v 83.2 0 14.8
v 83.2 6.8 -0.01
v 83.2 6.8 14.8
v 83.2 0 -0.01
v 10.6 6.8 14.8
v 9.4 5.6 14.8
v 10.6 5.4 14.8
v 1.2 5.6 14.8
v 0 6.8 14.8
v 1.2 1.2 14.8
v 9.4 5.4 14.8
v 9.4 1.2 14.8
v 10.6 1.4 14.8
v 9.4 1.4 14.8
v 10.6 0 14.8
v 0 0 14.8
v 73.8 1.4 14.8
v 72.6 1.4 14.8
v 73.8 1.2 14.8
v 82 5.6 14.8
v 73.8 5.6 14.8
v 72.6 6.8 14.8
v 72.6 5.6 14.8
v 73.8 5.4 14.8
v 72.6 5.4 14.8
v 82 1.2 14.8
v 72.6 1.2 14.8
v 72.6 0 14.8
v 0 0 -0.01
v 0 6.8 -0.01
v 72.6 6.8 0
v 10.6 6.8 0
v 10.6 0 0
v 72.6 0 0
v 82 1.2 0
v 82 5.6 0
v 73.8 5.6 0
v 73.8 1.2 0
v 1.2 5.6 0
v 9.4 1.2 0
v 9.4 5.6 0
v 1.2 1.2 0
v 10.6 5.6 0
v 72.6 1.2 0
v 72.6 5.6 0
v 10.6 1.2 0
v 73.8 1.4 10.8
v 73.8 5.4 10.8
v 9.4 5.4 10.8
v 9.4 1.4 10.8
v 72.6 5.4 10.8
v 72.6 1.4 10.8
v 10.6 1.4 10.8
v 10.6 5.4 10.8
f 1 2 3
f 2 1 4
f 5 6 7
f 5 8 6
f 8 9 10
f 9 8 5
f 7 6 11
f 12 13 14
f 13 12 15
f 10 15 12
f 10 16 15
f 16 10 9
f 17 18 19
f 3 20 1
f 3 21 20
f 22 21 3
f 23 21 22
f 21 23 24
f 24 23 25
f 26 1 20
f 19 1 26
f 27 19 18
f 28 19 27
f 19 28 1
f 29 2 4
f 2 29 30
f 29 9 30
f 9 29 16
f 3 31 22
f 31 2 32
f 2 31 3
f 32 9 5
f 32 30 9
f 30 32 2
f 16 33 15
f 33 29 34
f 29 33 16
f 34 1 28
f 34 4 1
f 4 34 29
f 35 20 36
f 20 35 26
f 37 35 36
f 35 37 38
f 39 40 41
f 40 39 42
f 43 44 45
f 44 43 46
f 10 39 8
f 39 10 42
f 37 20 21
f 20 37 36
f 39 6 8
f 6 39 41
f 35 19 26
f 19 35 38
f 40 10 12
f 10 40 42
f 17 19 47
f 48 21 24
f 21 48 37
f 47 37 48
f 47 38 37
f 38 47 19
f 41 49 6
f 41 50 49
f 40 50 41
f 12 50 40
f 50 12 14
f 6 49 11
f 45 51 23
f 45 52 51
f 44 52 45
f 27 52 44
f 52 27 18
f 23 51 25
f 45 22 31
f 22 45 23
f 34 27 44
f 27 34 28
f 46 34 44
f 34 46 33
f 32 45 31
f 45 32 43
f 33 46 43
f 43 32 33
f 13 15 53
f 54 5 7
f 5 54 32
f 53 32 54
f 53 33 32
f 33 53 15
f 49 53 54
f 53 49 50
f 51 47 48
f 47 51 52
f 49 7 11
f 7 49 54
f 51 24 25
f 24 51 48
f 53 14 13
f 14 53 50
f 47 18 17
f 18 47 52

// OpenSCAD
// file: ../Base/Boxes.scad
// Fischertechnik Box Foundation
// Pre-designed Boxes

use <Constants.scad>

include <PlacementOptions.scad>

box190Width = 190;
box190Depth = 130;
box130Width = 130;
box130Depth = 95;
boxUsageHeight = 33.9;
boxWallThickness = 2.4;
boxBaseThickness = 1.0;
boxWebWidth = 3.0;

// getBoxWallThickness()
// Gets the wall thickness of a Fischertechnik Box

function getBoxWallThickness() = boxWallThickness;

// Gets the usable height of a fischertechnik box
function getBoxUsageHeight() = boxUsageHeight;

// Gets the thickness of the Fischertechnik box base.
function getBoxBaseThickness() = boxBaseThickness;

// Gets the width of a box web
function getBoxWebWidth() = boxWebWidth;

// Gets the usable inner space of a Box 190 as an x/y-list
function getBox190Space() = [
    box190Width - 2*getBoxWallThickness(), 
    box190Depth - 2*getBoxWallThickness() ];

// Imports the Fischertechnik empty box 130x190 mm and places it at position 0,0
// 190x130 are the outer sizes, the inner space is slightly smaller. Use getBox190Space() to get the inner sizes.
// This module needs the STL file "Fischertechnik Box 130x190.stl" in the library path.
// The box is positioned that the usable inner space is at the 0,0,0 position. The

module Box190() {
    translate([-getBoxWallThickness(),-getBoxWallThickness(),-getBoxBaseThickness()])
        import("Fischertechnik Box 130x190.stl", convexity=3);
}

// Gets the usable inner space of a Box 130 as an x/y-list
function getBox130Space() = [
    box130Width - 2*getBoxWallThickness(), 
    box130Depth - 2*getBoxWallThickness() ];

// Imports the Fischertechnik empty box 95x130 mm and places it at position 0,0
// 190x130 are the outer sizes, the inner space is slightly smaller. Use getBox190Space() to get the inner sizes.
// This module needs the STL file "Fischertechnik Box 95x130.stl" in the library path.
// The box is positioned that the usable inner space is at the 0,0,0 position. The

module Box130() {
    translate([-getBoxWallThickness(),-getBoxWallThickness(),-getBoxBaseThickness()])
        import("Fischertechnik Box 95x130.stl", convexity=3);
}

// Creates a web at the specified box walls
// corner 0 = LowerLeft, 1 = UpperLeft, 2 = UpperRight, 3 = LowerRight
// side 0 = LeftOfCorner, 1 = RightOfCorner
// distance = Distance in mm from the corner
// box = inner width and depth of the box (default: Box 190)
// webWidth = length of the web (default is 3 mms)
// webThickness = thickness of the web (default is 1 mm)

module BoxWeb(corner, side, distance, box=getBox190Space(), webWidth=getBoxWebWidth(), webThickness=1.0) {
    sink = getBoxWallThickness()/2;

    width = (corner % 2 == 0) ? 
            (side == LeftOfCorner ? webWidth : webThickness) :
            (side == LeftOfCorner ? webThickness : webWidth);

    depth = (corner % 2 == 0) ? 
            (side == RightOfCorner ? webWidth : webThickness) :
            (side == RightOfCorner ? webThickness : webWidth);
    
    xDiff = corner == LowerLeft ? 
                (side == LeftOfCorner ? -sink : distance) :
            (corner == UpperLeft ?                
                (side == LeftOfCorner ? distance : -sink) :
            (corner == UpperRight ?
                (side == LeftOfCorner ? box.x-webWidth+sink : box.x-distance-webThickness) :
                (side == LeftOfCorner ? box.x-distance-webThickness: box.x-webWidth+sink)));

    yDiff = corner == LowerLeft ? 
                (side == RightOfCorner ? -sink : distance) :
            (corner == UpperLeft ?
                (side == RightOfCorner ? box.y-distance : box.y-webWidth+sink) :
            (corner == UpperRight ?
                (side == RightOfCorner ? box.y-webWidth+sink : box.y-distance) :
                (side == RightOfCorner ? distance : -sink)));
    
    translate([xDiff, yDiff, -getExcess()])
        cube([width, depth, boxUsageHeight + 2*getExcess()]);
}
// file: ../Base/Rotation.scad
// Fischertechnik Box Foundation
// Geometry Helpers Rotation

include <PlacementOptions.scad>

// getRotatedSpace(space, rotation=NoRotation)
// Rotates the space dependent on the specified rotation

function getRotatedSpace(space, rotation=NoRotation) = [
    (rotation == Rotate90 || rotation == Rotate270) ? space.y : space.x,
    (rotation == Rotate90 || rotation == Rotate270) ? space.x : space.y
];

// Rotates the given space around the fixed left lower corner
// space = the space the children needs as width/depth list [width,depth]
// rotation = 0 Rotate0 degrees, 1 Rotate90 degrees, 2 Rotate180 degrees, 3 Rotate270 degrees (equivalent to -90)

module RotateFix(space, rotation=Rotate0) {
    dy = (rotation == Rotate0 || rotation == Rotate270) ? 0 :
        (rotation == Rotate90) ? space.x :
        space.y;
    dx = (rotation < Rotate180) ? 0 :
        (rotation == Rotate180) ? space.x :
        space.y;
    
    translate([dx, dy, 0])
        rotate([0, 0, rotations[rotation]])
            children();
}
// file: ../Base/Alignment.scad
// Fischertechnik Box Foundation
// Geometry Helpers Alignment

include <PlacementOptions.scad>

// getAlignedX(elementWidth, spaceWidth, align=AlignRight, offset=0)
// Gets the aligned X offset of an element with the given
// width in the given space.
// elementWidth = The width of the element to positon
// spaceWidth = The space where the element should be aligned
// align = 0 AlignLeft, 1 AlignCenter, 2 AlignRight
// offset = an optional offset from the aligned position. When
// aligned left or centered, then positive values are in X direction.
// When aligned right then positive values are in negative X direction.

function getAlignedX(elementWidth, spaceWidth, align=AlignRight, offset=0) =
    (align == AlignLeft) ?
        offset :
        ((align == AlignCenter) ?
        (spaceWidth - elementWidth)/2 + offset :
        spaceWidth - offset - elementWidth);

// getAlignedY(elementDepth, spaceDepth, align=AlignTop, offset=0)
// Gets the aligned Y offset of an element with the given
// depth in the given space.
// elementDepth = The depth of the element to positon
// spaceDepth = The space where the element should be aligned
// align = 0 AlignBottom, 1 AlignCenter, 2 AlignTop
// offset = an optional offset from the aligned position. When
// aligned bottom or centered, then positive values are in Y direction.
// When aligned top then positive values are in negative Y direction.

function getAlignedY(elementDepth, spaceDepth, align=AlignTop, offset=0) =
    (align == AlignBottom) ?
        offset :
        ((align == AlignCenter) ?
        (spaceDepth - elementDepth)/2 + offset :
        spaceDepth - offset - elementDepth);
// file: ../Base/PlacementOptions.scad
// Fischertechnik Box Foundation
// Placement Options

// Alignment
NoAlign = 0;
AlignLeft = 1;
AlignBottom = 2;
AlignCenter = 3;
AlignRight = 4;
AlignTop = 5;

// Element rotation degree steps
rotations = [0, -90, -180, -270];

// Rotation
NoRotation = 0;
Rotate0 = 0;
Rotate90 = 1;
Rotate180 = 2;
Rotate270 = 3;

// Docking (seen from above)
NoDock = -1;
DockLeft = 0;
DockTop = 1;
DockRight = 2;
DockCorner = 2;
DockBottom = 3;

// Web corners
LowerLeft = 0;
UpperLeft = 1;
UpperRight = 2;
LowerRight = 3;

// Web position relative to corner
LeftOfCorner = 0;
RightOfCorner = 1;
// file: ../Base/Placement.scad
// Fischertechnik Box Foundation
// Geometry Helpers Placement

use <Constants.scad>
use <Alignment.scad>
use <Rotation.scad>
use <Boxes.scad>

include <PlacementOptions.scad>

// Place(x=0, y=0, elementSpace=[0,0], alignX=AlignLeft, alignY=AlignBottom, rotation=Rotate0, boxSpace=getBox190Space())
// Places the child at the specified position
// y = Y-Position. This is a relative position when an X aligment is specified.
// x = X-Position. This is a relative position when an Y aligment is specified.
// elementSpace = space of the element to be placed [x,y]
// alignX = -1=NoAlign, 0 AlignLeft, 1 AlignCenter, 3 AlignRight (elementSpace and boxSpace required!)
// alignY = -1=NoAlign, 2 AlignBottom, 1 AlignCenter, 4 AlignTop (elementSpace and boxSpace required!)
// rotation = 0 Rotate0 0 degrees, 1 Rotate90 90 degrees, 
// 2 Rotate180 180 degrees, 3 Rotate270 270 degrees (equivalent to -90)
// boxSpace = Inner space of the box where the placement occurs [x,y] - default is Box 190x130 inner space

module Place(x=0, y=0, elementSpace=[0,0], 
  alignX=AlignLeft, alignY=AlignBottom, 
  rotation=NoRotation, boxSpace=getBox190Space()) {

    module Position(x, y, space, rotation=Rotate0) {
        translate([x, y, 0])
            RotateFix(space, rotation)
                children();
    }

    space = getRotatedSpace(elementSpace, rotation);
    alignedX = getAlignedX(space.x, boxSpace.x, alignX, x);
    alignedY = getAlignedY(space.y, boxSpace.y, alignY, y);
    Position(alignedX, alignedY, elementSpace, rotation)
        children();
}

// Center(space=getBox130Space(), elementSpace=[0,0])
// space = Space where the children is centered. For cylinder use centered=true and no elementSpace.
// elementSpace = space of the element to be centered [x,y]

module Center(space=getBox190Space(), elementSpace=[0,0]) {
    translate([(space.x - elementSpace.x) / 2, (space.y - elementSpace.y) / 2])
        children(0);
}

// CenterHorizontal(width=0, y=0, offset=0, space=getBox130Space())
// space = Space where the children is centered. For cylinder use centered=true and no elementSpace.
// elementSpace = space of the element to be centered [x,y]

module CenterHorizontal(width=0, y=0, offset=0, space=getBox190Space()) {
    translate([(space.x - width) / 2 + offset, y])
        children(0);
}

// CenterVertical(depth=0, x=0, offset=0, space=getBox130Space())
// space = Space where the children is centered. For cylinder use centered=true and no elementSpace.
// elementSpace = space of the element to be centered [x,y]

module CenterVertical(depth=0, x=0, offset=0, space=getBox190Space()) {
    translate([x, (space.y - depth) / 2 + offset])
        children(0);
}
// file: ../Base/Constants.scad
// Fischertechnik Box Foundation
// Constants

// Constant values necessary for multiple elements

// Base constants
dividerThickness = 1.2;
excess = 0.01;
fragments = 90;
tolerance = 0.8;

// Gets the thickness of a divider 
function getDividerThickness() = dividerThickness;

// Gets the excess that is used to merge walls into each other
function getExcess() = excess;

// Gets amount of fragments of a cylinder
function getFragments() = fragments;

// Gets the inner tolerance of a frame to each side
function getTolerance() = tolerance;


// Fischertechnik specific constants
axisDiameter = 4;
axisBottomDiameter = axisDiameter + 1;
standardEdgeDistance = 2.5;
standardWebDistance = 11.5;
standardCornerLength = 15;
tubeWallFactor = 0.8;

// Gets axis diameter
function getAxisDiameter() = axisDiameter;

// Gets axis bottom diameter for thicker part at the bottom
function getAxisBottomDiameter() = axisBottomDiameter;

// gets the standard distance to the wall of the box for dockable frames with webs
function getStandardEdgeDistance() = standardEdgeDistance;

// gets the standard distance of each web to the corner of the dockable frame
function getStandardWebDistance() = standardWebDistance;

// gets the standard length of the corner walls of a dockable frame
function getStandardCornerLength() = standardCornerLength;

// gets the wall thickness of a tube.
function getTubeWallThickness() = tubeWallFactor * getDividerThickness();
// main file
// Fischertechnik Box Library
// Frame for single 80 mm Axis
// 37384

use <../ModelBase/Complex.scad>

length = 80;

// getFrameAxis80Space()
// Gets the width (.x) and depth (.y) of the axis frame.

function getFrameAxis80Space() = getFrameAxisSpace(length);

// FrameAxis80()
// Axis holder for a single 80 mm axis.

module FrameAxis80() {
    FrameAxis(length);
}

// Test
color("lightgray")
FrameAxis80();
